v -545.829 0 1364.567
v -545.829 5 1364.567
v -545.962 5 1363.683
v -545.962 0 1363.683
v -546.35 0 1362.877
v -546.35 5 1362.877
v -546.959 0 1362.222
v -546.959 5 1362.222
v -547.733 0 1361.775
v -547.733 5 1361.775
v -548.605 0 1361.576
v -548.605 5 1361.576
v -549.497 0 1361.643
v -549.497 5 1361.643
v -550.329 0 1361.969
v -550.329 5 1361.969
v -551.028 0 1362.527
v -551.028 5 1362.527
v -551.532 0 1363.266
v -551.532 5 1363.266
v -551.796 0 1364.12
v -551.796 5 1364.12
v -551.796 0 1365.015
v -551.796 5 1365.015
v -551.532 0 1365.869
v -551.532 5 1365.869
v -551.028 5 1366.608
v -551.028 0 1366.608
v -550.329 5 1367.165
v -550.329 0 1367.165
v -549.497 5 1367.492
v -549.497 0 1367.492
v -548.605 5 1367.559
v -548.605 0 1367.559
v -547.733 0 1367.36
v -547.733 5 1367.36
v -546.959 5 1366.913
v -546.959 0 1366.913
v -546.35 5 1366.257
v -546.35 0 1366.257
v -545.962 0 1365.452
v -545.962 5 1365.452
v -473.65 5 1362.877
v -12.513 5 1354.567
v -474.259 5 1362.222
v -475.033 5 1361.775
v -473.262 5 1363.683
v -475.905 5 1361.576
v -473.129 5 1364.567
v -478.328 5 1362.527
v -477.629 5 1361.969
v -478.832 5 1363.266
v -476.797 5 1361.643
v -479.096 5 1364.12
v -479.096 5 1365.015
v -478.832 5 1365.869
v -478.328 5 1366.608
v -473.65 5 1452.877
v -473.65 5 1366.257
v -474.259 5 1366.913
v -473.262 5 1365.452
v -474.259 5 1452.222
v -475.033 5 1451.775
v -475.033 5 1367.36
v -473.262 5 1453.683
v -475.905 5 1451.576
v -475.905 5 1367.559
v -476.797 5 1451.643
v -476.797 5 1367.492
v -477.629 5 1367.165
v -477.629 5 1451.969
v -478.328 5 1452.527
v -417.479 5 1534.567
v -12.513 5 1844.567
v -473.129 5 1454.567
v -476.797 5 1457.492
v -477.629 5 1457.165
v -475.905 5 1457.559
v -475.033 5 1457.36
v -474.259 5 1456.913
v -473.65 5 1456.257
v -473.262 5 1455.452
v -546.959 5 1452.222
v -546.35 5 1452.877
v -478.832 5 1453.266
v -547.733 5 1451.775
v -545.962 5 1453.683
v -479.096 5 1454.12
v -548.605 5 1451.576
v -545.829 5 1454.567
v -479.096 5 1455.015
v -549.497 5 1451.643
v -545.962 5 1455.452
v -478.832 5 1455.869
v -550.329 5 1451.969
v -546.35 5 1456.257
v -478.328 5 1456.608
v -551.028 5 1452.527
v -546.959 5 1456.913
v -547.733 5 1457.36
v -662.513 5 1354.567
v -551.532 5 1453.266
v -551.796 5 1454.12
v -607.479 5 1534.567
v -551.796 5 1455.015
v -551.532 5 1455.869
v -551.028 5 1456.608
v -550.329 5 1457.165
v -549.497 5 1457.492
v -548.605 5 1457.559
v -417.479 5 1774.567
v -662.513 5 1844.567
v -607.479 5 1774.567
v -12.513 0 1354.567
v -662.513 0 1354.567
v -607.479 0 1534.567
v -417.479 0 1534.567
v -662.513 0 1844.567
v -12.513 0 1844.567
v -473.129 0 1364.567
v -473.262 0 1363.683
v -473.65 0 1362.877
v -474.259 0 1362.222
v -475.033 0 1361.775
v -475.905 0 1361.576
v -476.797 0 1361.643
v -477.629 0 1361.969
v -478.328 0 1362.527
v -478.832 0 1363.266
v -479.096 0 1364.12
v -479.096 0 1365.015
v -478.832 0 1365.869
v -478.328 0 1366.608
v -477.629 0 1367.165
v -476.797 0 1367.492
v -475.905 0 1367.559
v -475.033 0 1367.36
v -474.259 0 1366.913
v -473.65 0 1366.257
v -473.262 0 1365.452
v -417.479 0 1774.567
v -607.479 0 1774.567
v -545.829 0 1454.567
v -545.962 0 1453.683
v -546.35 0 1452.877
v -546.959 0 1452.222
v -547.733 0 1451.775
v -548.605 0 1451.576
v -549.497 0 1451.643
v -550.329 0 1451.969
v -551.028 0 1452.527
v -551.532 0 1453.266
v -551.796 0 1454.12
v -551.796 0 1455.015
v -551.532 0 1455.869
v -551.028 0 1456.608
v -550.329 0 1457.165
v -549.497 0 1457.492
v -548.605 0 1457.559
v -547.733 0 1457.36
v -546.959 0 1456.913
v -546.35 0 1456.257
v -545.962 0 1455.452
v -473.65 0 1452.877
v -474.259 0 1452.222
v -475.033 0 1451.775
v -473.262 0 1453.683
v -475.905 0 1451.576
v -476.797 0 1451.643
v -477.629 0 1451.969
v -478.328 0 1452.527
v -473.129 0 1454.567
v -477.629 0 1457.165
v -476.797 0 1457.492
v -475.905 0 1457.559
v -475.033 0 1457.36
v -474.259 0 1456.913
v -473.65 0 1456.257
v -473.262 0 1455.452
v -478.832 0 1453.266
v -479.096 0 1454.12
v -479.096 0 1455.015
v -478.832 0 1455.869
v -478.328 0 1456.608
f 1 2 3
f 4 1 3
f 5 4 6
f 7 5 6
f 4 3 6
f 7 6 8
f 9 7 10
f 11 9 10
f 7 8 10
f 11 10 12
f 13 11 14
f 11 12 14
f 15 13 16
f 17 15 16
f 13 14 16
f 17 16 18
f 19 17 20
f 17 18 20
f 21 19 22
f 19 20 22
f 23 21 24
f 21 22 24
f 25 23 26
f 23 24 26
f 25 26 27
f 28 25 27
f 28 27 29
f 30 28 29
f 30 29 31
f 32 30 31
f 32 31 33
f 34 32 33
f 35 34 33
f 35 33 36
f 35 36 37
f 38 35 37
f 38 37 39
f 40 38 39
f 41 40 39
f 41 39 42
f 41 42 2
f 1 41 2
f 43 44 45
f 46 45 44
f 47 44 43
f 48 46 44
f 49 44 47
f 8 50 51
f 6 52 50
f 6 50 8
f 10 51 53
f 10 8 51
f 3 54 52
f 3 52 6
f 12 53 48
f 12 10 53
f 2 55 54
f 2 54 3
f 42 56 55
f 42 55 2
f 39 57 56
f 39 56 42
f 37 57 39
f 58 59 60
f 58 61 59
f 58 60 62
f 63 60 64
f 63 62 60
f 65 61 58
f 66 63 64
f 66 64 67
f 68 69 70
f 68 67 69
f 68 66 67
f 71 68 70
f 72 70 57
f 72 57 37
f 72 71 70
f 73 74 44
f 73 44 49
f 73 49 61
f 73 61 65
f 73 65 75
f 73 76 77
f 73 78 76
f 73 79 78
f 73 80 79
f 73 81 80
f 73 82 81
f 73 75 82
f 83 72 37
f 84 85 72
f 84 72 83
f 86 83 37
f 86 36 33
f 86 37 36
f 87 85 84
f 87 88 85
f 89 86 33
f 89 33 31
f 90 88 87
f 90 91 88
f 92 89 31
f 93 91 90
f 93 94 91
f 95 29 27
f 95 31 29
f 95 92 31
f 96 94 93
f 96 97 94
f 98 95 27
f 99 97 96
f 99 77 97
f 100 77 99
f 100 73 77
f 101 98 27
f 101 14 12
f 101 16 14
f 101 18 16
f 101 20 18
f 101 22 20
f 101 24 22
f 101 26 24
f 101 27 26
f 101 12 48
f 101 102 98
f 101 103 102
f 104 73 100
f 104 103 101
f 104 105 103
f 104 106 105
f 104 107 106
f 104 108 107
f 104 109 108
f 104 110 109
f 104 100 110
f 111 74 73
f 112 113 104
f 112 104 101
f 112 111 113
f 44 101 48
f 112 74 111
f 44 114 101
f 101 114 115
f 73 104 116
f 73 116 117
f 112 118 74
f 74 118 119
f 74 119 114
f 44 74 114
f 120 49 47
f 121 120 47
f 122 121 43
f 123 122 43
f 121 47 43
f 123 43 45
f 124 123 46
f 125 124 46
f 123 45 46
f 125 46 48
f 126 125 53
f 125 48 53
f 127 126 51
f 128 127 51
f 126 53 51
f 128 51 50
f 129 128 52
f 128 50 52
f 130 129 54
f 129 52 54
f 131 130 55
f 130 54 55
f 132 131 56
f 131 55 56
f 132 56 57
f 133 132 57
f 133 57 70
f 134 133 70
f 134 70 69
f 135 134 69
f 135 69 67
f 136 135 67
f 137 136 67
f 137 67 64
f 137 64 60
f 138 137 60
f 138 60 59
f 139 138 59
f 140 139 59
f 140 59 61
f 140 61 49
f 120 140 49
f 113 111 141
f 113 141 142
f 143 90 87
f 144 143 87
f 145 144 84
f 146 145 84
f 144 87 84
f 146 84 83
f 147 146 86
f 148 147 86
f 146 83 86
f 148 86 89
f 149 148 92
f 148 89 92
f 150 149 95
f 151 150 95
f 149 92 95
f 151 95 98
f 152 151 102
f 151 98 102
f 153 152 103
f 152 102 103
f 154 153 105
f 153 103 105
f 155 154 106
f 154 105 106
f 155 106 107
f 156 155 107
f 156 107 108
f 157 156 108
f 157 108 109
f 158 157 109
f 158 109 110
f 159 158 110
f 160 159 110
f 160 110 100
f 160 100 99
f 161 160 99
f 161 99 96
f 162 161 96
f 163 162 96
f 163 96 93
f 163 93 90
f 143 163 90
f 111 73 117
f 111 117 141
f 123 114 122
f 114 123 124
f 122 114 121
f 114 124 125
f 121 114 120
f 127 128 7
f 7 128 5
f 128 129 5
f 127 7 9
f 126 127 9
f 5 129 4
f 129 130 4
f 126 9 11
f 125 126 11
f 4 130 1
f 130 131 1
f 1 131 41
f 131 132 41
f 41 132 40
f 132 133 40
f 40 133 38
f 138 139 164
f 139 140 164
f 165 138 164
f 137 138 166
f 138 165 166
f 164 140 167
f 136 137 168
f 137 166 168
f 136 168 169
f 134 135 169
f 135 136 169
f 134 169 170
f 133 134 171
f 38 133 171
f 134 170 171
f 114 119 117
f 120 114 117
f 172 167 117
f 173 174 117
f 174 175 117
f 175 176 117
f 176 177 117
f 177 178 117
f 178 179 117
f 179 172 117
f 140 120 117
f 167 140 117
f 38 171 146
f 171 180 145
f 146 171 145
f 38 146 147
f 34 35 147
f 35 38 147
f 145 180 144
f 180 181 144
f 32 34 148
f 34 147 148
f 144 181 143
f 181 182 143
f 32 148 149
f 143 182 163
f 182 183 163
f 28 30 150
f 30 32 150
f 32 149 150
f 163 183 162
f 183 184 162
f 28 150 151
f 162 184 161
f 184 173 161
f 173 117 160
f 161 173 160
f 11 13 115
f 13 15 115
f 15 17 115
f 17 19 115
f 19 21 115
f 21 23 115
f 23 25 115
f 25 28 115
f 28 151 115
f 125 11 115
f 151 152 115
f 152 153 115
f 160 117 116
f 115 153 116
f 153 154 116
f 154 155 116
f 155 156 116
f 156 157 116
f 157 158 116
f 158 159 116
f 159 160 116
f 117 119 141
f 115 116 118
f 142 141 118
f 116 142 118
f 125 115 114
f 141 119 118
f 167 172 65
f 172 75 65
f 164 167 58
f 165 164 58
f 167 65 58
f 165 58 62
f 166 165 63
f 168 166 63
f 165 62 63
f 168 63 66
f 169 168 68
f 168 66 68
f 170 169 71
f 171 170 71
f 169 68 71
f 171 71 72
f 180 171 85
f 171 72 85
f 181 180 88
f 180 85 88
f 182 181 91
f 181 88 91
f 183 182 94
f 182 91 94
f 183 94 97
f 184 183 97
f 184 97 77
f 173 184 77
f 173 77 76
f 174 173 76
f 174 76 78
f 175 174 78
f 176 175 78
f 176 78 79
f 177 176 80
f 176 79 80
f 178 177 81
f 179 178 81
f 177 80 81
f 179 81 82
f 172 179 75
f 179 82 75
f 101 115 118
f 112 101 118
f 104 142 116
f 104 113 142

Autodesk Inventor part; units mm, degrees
ref_plane "YZ Plane" through (0, 0, 0) normal (1, 0, 0) x (0, 1, 0)
ref_plane "XZ Plane" through (0, 0, 0) normal (0, 1, 0) x (-1, 0, 0)
ref_plane "XY Plane" through (0, 0, 0) normal (0, 0, 1) x (1, 0, 0)
sketch "Boceto1" plane through (0, 0, 0) normal (0, 1, 0) x (-1, 0, 0)
  line L0 (662.5132, 1844.5674) -> (12.5132, 1844.5674)
  line L1 (12.5132, 1844.5674) -> (12.5132, 1354.5674)
  line L2 (12.5132, 1354.5674) -> (662.5132, 1354.5674)
  line L3 (662.5132, 1354.5674) -> (662.5132, 1844.5674)
  point P0 (0, 0)
  dimension "d0" = 650
  dimension "d1" = 490
extrude "Extrusión1" add sketch "Boceto1" along normal blind 5
sketch "Boceto2" plane through (0, 5, 0) normal (0, 1, 0) x (1, 0, 0)
  arc A0 (-288.7292, -1279.5674) -> (-301.2292, -1279.5674) centre (-294.9792, -1279.5674) ccw projected
  circle A1 centre (-548.8292, -1364.5674) radius 3
  circle A2 centre (-476.1292, -1364.5674) radius 3
  circle A3 centre (-476.1292, -1454.5674) radius 3
  circle A4 centre (-548.8292, -1454.5674) radius 3
  point P0 (0, 0)
  dimension "d6" = 6
  dimension "d7" = 253.85
  dimension "d9" = 6
  dimension "d10" = 72.7
  dimension "d11" = 6
  dimension "d12" = 6
  dimension "d13" = 90
  dimension "d14" = 90
extrude "Extrusión3" cut sketch "Boceto2" against normal through all
sketch "Boceto3" plane through (0, 5, 0) normal (0, 1, 0) x (1, 0, 0)
  line L0 (-502.9542, -1515.5674) -> (-522.0042, -1515.5674) projected
  line L1 (-607.4792, -1534.5674) -> (-417.4792, -1534.5674)
  line L2 (-417.4792, -1534.5674) -> (-417.4792, -1774.5674)
  line L3 (-417.4792, -1774.5674) -> (-607.4792, -1774.5674)
  line L4 (-607.4792, -1774.5674) -> (-607.4792, -1534.5674)
  line L5 (-662.5132, -1844.5674) -> (-12.5132, -1844.5674) projected
  point P0 (0, 0)
  point P1 (-512.4792, -1534.5674)
  point P2 (-512.4792, -1515.5674)
  dimension "d17" = 190
  dimension "d18" = 240
  dimension "d19" = 70
extrude "Extrusión4" cut sketch "Boceto3" against normal through all
properties material "Aluminio 6061"
